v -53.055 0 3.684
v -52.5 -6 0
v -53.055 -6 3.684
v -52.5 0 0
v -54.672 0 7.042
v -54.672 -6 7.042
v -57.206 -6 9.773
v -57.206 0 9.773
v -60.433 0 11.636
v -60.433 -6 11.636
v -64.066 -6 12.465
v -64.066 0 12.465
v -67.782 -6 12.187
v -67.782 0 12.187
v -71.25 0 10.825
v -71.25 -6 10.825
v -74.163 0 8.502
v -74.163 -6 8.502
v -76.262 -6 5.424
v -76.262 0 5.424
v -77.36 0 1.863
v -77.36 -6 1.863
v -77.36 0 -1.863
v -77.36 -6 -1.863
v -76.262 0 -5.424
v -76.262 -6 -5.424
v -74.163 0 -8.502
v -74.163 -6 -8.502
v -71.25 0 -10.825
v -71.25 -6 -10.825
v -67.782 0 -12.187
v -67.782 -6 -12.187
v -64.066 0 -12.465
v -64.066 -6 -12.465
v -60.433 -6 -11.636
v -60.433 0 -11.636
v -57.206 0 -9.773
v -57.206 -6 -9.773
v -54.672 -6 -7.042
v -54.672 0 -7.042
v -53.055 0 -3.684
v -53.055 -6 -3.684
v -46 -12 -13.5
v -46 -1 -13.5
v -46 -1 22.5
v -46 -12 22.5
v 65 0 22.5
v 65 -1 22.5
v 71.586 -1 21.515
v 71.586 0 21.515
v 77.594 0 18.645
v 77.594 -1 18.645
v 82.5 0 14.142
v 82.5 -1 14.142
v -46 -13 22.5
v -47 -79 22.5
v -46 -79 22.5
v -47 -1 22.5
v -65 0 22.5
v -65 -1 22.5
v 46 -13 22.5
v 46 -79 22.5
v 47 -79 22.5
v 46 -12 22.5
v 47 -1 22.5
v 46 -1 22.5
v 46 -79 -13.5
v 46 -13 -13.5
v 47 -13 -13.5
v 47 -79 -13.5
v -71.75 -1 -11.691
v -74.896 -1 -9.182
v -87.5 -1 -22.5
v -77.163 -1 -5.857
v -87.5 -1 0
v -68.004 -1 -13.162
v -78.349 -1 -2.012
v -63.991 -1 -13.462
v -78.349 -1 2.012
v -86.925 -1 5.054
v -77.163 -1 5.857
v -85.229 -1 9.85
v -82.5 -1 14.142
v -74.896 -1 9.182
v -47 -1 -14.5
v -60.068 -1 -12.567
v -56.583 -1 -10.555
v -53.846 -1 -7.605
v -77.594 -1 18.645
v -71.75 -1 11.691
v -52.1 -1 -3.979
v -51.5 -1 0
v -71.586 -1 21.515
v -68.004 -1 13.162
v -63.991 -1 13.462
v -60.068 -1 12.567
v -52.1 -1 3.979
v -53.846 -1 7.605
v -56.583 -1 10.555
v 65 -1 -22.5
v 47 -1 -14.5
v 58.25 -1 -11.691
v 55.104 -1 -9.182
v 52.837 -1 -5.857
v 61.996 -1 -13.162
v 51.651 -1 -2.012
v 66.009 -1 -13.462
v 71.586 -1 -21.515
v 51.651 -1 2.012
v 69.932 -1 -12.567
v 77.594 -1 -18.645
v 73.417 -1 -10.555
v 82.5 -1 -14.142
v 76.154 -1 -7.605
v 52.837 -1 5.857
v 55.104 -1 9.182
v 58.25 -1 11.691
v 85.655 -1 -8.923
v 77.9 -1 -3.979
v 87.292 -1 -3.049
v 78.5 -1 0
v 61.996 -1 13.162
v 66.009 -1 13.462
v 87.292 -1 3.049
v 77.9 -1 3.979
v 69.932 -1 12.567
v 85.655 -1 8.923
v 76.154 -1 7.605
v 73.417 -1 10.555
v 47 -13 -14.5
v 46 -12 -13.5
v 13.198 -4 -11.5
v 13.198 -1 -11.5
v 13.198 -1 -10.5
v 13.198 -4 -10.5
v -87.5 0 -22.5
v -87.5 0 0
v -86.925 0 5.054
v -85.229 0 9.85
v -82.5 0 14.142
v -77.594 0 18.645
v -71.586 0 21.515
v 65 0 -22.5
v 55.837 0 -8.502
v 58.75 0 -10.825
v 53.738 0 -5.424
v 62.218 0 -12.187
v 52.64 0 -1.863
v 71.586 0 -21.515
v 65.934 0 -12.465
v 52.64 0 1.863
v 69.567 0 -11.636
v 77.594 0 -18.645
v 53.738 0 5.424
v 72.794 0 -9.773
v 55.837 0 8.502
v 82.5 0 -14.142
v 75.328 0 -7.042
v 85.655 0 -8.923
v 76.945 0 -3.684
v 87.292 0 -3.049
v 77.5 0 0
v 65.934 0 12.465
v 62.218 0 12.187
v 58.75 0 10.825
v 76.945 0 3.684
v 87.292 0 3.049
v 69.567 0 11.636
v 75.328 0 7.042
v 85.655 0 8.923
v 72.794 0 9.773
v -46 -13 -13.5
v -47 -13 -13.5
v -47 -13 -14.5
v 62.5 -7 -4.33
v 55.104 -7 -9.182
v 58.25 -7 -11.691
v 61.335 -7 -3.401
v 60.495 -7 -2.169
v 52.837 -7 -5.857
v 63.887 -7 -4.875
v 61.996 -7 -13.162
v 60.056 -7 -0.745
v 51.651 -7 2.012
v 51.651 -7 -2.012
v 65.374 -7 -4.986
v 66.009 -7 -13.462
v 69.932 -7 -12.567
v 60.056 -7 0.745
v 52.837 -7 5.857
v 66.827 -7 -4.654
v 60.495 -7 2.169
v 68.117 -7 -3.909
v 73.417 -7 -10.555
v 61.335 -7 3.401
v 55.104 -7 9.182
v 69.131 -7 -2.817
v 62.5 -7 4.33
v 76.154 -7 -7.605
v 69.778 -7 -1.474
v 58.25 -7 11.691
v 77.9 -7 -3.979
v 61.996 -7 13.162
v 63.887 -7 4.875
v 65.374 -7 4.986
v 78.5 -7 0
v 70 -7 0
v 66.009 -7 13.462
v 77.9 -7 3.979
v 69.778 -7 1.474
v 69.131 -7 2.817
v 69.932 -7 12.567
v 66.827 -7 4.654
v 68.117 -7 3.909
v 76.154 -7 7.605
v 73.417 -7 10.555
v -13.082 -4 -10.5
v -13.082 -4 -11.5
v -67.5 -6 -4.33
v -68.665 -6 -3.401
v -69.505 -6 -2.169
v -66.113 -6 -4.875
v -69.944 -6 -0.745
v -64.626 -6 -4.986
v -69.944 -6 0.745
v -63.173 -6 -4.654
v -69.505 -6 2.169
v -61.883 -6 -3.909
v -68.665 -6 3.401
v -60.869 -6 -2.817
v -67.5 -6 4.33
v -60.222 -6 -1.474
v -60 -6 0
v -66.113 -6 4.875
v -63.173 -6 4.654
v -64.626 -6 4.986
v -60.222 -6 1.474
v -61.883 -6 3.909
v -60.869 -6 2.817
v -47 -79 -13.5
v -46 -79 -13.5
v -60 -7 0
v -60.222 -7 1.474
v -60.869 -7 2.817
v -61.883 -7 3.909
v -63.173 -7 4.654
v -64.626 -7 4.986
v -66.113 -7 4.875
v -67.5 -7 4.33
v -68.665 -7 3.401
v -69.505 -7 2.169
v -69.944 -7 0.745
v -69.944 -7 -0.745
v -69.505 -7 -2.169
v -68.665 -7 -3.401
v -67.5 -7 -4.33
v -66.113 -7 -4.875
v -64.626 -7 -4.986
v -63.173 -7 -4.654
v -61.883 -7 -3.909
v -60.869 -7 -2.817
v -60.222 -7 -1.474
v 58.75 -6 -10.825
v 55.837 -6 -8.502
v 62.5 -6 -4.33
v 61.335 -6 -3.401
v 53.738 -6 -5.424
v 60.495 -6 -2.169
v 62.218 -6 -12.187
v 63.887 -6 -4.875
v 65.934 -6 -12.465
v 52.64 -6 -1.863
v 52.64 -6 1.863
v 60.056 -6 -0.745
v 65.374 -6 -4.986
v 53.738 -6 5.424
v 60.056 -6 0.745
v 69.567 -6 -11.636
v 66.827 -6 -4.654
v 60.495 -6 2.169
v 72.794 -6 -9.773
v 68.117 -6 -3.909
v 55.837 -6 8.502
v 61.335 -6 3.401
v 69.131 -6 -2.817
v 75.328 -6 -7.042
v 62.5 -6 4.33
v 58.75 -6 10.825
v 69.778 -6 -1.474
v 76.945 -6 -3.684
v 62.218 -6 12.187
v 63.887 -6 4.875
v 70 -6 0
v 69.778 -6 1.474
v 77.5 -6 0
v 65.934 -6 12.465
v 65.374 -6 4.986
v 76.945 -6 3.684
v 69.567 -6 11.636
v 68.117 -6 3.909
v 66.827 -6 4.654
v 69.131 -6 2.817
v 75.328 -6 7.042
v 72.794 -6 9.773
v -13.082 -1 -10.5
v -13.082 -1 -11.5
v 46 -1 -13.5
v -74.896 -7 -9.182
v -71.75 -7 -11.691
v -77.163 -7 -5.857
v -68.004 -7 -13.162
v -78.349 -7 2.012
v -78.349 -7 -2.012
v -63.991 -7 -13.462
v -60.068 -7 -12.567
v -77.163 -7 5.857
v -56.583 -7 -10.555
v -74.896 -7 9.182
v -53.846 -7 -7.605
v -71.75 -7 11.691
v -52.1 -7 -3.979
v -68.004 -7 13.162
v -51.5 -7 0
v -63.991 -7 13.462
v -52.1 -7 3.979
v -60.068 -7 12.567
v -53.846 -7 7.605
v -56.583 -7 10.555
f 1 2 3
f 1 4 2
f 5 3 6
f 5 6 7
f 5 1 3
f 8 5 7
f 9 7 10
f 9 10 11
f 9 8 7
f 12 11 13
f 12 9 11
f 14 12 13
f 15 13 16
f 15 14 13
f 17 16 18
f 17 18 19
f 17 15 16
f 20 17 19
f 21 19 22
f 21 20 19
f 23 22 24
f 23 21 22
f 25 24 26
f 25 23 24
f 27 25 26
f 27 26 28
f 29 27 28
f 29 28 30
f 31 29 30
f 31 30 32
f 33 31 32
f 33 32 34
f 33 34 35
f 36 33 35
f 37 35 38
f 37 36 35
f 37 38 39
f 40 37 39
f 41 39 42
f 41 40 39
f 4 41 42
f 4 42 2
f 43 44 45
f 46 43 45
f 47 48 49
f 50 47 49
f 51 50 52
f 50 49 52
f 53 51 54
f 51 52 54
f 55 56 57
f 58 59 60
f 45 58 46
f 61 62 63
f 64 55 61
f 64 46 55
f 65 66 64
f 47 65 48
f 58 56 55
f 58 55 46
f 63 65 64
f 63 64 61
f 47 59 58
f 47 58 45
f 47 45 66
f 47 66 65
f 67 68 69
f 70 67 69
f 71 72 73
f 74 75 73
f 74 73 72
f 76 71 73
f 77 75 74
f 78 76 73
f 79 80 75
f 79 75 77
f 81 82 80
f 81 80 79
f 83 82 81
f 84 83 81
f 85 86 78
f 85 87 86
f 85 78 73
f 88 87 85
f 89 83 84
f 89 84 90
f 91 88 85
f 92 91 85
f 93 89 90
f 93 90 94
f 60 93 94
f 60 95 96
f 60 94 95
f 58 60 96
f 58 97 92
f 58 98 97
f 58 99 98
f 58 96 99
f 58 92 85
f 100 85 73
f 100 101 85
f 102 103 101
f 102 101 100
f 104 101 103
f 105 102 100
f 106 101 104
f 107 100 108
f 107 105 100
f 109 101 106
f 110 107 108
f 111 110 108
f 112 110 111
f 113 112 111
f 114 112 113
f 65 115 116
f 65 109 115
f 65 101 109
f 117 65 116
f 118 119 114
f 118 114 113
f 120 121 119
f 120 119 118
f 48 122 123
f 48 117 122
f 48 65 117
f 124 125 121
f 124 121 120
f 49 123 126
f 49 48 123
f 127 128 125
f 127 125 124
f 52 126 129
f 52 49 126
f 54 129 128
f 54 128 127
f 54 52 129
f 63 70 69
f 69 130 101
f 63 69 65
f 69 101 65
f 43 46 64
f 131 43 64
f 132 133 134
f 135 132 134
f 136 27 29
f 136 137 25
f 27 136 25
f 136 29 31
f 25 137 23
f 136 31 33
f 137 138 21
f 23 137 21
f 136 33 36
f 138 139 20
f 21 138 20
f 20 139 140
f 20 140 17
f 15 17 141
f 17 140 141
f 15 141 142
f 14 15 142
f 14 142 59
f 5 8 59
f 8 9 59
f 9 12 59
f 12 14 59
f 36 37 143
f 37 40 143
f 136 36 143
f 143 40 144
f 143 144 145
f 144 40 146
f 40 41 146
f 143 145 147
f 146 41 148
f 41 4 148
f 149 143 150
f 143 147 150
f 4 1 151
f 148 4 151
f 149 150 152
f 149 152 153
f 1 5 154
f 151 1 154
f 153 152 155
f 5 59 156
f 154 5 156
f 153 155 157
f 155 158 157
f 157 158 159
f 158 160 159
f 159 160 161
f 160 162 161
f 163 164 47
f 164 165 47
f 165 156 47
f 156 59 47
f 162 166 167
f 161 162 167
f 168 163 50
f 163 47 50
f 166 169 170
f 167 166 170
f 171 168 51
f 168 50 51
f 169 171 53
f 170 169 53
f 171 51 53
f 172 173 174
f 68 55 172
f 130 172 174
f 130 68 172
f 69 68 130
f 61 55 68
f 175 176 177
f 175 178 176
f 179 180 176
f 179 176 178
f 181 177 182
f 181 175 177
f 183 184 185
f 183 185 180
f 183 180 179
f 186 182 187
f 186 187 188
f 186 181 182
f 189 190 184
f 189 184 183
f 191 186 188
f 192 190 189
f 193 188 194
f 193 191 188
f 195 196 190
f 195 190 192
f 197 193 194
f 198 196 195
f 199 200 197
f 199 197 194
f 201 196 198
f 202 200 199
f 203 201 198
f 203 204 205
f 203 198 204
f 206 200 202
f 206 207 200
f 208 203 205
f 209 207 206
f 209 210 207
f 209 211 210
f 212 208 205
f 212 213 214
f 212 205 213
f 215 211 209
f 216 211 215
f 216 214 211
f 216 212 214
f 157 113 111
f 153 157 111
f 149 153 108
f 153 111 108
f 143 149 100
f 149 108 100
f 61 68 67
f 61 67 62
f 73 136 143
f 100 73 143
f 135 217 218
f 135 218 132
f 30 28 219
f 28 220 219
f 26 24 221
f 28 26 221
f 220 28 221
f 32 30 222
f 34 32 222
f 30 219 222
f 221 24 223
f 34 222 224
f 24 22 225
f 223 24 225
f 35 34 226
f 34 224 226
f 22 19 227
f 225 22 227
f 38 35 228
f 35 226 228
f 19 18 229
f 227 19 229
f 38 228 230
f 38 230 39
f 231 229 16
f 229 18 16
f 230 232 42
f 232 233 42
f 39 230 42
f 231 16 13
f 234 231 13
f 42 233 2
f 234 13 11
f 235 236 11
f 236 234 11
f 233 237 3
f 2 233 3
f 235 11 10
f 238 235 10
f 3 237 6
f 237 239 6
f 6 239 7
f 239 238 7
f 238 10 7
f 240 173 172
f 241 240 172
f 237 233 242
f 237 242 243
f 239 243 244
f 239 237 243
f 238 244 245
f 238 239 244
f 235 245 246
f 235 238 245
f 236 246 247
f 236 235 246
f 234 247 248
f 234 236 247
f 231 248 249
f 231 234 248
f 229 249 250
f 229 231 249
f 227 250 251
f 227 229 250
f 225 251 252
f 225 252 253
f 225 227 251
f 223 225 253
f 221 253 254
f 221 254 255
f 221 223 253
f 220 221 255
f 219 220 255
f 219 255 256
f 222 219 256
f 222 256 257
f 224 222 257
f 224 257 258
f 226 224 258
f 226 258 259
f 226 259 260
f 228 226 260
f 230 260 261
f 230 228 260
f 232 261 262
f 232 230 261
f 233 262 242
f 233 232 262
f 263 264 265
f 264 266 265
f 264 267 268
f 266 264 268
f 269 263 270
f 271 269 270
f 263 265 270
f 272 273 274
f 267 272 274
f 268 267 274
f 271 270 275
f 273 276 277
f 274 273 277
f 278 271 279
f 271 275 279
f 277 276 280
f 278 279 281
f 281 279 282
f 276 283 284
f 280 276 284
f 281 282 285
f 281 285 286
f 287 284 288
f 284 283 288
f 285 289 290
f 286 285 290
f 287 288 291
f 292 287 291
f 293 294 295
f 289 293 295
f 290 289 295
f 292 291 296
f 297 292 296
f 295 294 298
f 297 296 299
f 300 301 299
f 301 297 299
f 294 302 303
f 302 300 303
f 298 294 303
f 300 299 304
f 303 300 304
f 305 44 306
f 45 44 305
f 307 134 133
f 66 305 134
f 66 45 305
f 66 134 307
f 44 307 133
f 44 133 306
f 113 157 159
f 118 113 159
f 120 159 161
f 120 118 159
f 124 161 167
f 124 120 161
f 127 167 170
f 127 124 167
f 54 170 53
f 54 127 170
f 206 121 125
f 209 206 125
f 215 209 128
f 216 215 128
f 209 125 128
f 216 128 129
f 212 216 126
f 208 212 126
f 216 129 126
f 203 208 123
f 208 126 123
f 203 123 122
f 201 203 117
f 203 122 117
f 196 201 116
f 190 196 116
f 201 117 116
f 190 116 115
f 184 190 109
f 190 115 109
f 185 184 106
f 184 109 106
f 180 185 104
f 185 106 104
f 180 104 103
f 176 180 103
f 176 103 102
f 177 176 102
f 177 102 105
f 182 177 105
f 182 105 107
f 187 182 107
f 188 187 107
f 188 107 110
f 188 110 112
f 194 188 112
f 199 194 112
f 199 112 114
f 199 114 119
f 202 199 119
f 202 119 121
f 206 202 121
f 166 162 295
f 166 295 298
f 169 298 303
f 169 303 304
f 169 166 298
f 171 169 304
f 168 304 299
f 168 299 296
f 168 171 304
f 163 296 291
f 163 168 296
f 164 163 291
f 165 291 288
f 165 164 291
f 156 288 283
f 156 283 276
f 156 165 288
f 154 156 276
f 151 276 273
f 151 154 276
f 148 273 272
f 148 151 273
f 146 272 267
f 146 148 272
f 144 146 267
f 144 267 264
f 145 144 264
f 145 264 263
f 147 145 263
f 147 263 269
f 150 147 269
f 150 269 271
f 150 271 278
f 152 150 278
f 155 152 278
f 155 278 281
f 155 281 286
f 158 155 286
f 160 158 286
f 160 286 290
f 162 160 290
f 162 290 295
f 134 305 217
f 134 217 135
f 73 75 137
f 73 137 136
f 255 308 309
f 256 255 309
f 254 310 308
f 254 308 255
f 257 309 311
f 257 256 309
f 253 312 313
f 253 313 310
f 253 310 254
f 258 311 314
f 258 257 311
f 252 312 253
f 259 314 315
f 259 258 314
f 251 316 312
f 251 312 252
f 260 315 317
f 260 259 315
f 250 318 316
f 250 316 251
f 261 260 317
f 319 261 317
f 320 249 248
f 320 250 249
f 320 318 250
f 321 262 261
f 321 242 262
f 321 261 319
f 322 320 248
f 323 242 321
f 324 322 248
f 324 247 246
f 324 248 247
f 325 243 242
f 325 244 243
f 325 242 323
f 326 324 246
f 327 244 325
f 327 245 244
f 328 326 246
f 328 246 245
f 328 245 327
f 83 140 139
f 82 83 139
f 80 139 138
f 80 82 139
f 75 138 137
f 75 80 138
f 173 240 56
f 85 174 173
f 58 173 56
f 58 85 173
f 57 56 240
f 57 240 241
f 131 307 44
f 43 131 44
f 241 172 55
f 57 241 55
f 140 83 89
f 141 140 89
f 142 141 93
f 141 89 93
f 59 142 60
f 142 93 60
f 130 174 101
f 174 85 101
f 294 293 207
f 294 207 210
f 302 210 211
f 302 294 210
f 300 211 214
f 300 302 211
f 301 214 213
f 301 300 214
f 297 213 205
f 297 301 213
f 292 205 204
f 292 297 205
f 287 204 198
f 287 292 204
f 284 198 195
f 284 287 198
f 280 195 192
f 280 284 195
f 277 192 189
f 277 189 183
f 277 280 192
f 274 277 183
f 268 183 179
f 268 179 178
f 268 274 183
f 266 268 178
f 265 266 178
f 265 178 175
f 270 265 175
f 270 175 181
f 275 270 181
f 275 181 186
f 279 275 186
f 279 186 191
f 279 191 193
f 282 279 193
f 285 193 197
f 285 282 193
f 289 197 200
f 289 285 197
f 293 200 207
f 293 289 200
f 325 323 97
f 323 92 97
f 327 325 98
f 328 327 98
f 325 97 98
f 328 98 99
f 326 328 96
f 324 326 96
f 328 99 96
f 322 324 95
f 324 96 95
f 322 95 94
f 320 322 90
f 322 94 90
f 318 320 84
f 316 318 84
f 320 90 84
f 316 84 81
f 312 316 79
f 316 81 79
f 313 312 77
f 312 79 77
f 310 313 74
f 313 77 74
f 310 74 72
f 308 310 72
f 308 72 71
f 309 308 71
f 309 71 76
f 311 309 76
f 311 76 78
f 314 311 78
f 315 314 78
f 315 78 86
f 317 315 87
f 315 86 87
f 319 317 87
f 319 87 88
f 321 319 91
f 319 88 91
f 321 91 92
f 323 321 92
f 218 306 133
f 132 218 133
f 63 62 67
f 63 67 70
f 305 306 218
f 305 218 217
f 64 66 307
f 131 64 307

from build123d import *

# Parameters (mm, degrees)
F0_W      = 165
F0_H      = 45
F0_R      = 12.5
F1_DEPTH  = 1
F3_DEPTH  = 1
F4_DEPTH  = 25
F5_DEPTH  = 25
F6_R      = 13.5
F6_R_2    = 12.5
F7_DEPTH  = 5
F8_R      = 13.5
F8_R_2    = 5
F9_DEPTH  = 1
F11_DEPTH = 1
F12_W     = 1
F12_H     = 1
F12_H_2   = 36
F12_W_2   = 92
F13_DEPTH = 11
F14_W     = 94
F14_H     = 37
F15_DEPTH = 1
F16_W     = 1
F16_H     = 36
F17_DEPTH = 66
F18_W     = 26.2803444985
F18_H     = 1
F19_DEPTH = 3


with BuildPart() as f1:
    # F0 (on Front) → F1 (new body)
    with BuildSketch(Plane.XZ):
        Rectangle(F0_W, F0_H)
        with Locations((-65, 0)):
            Circle(F0_R, mode=Mode.SUBTRACT)
        with Locations((65, 0)):
            Circle(F0_R, mode=Mode.SUBTRACT)
    extrude(amount=F1_DEPTH)

    # F2 (on face) → F3 (join)
    with BuildSketch(Plane.XZ.offset(1)):
        with BuildLine():
            Line((68.3925151825, -19.0988145769), (65, -22.5))
            ThreePointArc((65, -22.5), (87.5, 0), (65, 22.5))
            Line((65, 22.5), (71.474224329, 16.2770561874))
            Line((71.474224329, 16.2770561874), (77.4062722921, 9.1145541519))
            Line((77.4062722921, 9.1145541519), (80.3926512599, 2.1407562308))
            Line((80.3926512599, 2.1407562308), (80.3926512599, -5.2317115478))
            Line((80.3926512599, -5.2317115478), (78.3914923668, -12.1520543471))
            Line((78.3914923668, -12.1520543471), (74.6632069349, -14.4081749022))
            Line((74.6632069349, -14.4081749022), (68.3925151825, -19.0988145769))
        make_face()
        with BuildLine():
            Line((-65, 14.9617949501), (-65, 22.5))
            ThreePointArc((-65, 22.5), (-87.5, 0), (-65, -22.5))
            Line((-65, -22.5), (-67.4760043621, -15.6979020685))
            Line((-67.4760043621, -15.6979020685), (-72.8440880775, -12.9142012447))
            Line((-72.8440880775, -12.9142012447), (-76.5851810575, -7.8018400818))
            Line((-76.5851810575, -7.8018400818), (-79.5639529824, 0))
            Line((-79.5639529824, 0), (-79.5639529824, 6.4657721668))
            Line((-79.5639529824, 6.4657721668), (-75.4495188594, 11.7608513683))
            Line((-75.4495188594, 11.7608513683), (-65, 14.9617949501))
        make_face()
    extrude(amount=-F3_DEPTH)

    # F2 (on face) → F4 (cut)
    with BuildSketch(Plane.XZ.offset(1)):
        with BuildLine():
            Line((-82.5, 22.5), (-82.5, 14.1421356237))
            ThreePointArc((-82.5, 14.1421356237), (-74.6966991411, 20.3033008589), (-65, 22.5))
            Line((-65, 22.5), (-82.5, 22.5))
        make_face()
    extrude(amount=-F4_DEPTH, mode=Mode.SUBTRACT)

    # F2 (on face) → F5 (cut)
    with BuildSketch(Plane.XZ.offset(1)):
        with BuildLine():
            ThreePointArc((82.5, -14.1421356237), (74.6966991411, -20.3033008589), (65, -22.5))
            Line((65, -22.5), (82.5, -22.5))
            Line((82.5, -22.5), (82.5, -14.1421356237))
        make_face()
        with BuildLine():
            ThreePointArc((65, 22.5), (74.6966991411, 20.3033008589), (82.5, 14.1421356237))
            Line((82.5, 14.1421356237), (82.5, 22.5))
            Line((82.5, 22.5), (65, 22.5))
        make_face()
        with BuildLine():
            Line((-82.5, -22.5), (-65, -22.5))
            ThreePointArc((-65, -22.5), (-74.6966991411, -20.3033008589), (-82.5, -14.1421356237))
            Line((-82.5, -14.1421356237), (-82.5, -22.5))
        make_face()
    extrude(amount=-F5_DEPTH, mode=Mode.SUBTRACT)

    # F6 (on face) → F7 (join)
    with BuildSketch(Plane.XZ.offset(1)):
        with Locations((-65, 0)):
            Circle(F6_R)
        with Locations((-65, 0)):
            Circle(F6_R_2, mode=Mode.SUBTRACT)
        with Locations((65, 0)):
            Circle(F6_R)
        with Locations((65, 0)):
            Circle(F6_R_2, mode=Mode.SUBTRACT)
    extrude(amount=F7_DEPTH)

    # F8 (on face) → F9 (join)
    with BuildSketch(Plane.XZ.offset(6)):
        with Locations((-65, 0)):
            Circle(F8_R)
        with Locations((-65, 0)):
            Circle(F8_R_2, mode=Mode.SUBTRACT)
        with Locations((65, 0)):
            Circle(F8_R)
        with Locations((65, 0)):
            Circle(F8_R_2, mode=Mode.SUBTRACT)
    extrude(amount=F9_DEPTH)

    # F10 (on face) → F11 (join)
    with BuildSketch(Plane.XZ.offset(1)):
        Polygon((-81.9395110011, 0), (-87.5, 0), (-87.5, -22.5), (-65, -22.5), (-65, -18.5897927731), (-73.3228996396, -16.0001199692), (-80.1934376359, -9.6208481118), align=None)
    extrude(amount=-F11_DEPTH)

    # F12 (on face) → F13 (join)
    with BuildSketch(Plane.XZ.offset(1)):
        with Locations((46.5, -14)):
            Rectangle(F12_W, F12_H)
        with Locations((46.5, 4.5)):
            Rectangle(F12_W, F12_H_2)
        with Locations((0, -14)):
            Rectangle(F12_W_2, F12_H)
        with Locations((-46.5, -14)):
            Rectangle(F12_W, F12_H)
        with Locations((-46.5, 4.5)):
            Rectangle(F12_W, F12_H_2)
    extrude(amount=F13_DEPTH)

    # F14 (on face) → F15 (join)
    with BuildSketch(Plane.XZ.offset(12)):
        with Locations((0, 4)):
            Rectangle(F14_W, F14_H)
    extrude(amount=F15_DEPTH)

    # F16 (on face) → F17 (join)
    with BuildSketch(Plane.XZ.offset(13)):
        with Locations((-46.5, 4.5)):
            Rectangle(F16_W, F16_H)
        with Locations((46.5, 4.5)):
            Rectangle(F16_W, F16_H)
    extrude(amount=F17_DEPTH)

    # F18 (on face) → F19 (join)
    with BuildSketch(Plane.XZ.offset(1)):
        with Locations((0.058112666, -11)):
            Rectangle(F18_W, F18_H)
    extrude(amount=F19_DEPTH)


solid = f1.part
